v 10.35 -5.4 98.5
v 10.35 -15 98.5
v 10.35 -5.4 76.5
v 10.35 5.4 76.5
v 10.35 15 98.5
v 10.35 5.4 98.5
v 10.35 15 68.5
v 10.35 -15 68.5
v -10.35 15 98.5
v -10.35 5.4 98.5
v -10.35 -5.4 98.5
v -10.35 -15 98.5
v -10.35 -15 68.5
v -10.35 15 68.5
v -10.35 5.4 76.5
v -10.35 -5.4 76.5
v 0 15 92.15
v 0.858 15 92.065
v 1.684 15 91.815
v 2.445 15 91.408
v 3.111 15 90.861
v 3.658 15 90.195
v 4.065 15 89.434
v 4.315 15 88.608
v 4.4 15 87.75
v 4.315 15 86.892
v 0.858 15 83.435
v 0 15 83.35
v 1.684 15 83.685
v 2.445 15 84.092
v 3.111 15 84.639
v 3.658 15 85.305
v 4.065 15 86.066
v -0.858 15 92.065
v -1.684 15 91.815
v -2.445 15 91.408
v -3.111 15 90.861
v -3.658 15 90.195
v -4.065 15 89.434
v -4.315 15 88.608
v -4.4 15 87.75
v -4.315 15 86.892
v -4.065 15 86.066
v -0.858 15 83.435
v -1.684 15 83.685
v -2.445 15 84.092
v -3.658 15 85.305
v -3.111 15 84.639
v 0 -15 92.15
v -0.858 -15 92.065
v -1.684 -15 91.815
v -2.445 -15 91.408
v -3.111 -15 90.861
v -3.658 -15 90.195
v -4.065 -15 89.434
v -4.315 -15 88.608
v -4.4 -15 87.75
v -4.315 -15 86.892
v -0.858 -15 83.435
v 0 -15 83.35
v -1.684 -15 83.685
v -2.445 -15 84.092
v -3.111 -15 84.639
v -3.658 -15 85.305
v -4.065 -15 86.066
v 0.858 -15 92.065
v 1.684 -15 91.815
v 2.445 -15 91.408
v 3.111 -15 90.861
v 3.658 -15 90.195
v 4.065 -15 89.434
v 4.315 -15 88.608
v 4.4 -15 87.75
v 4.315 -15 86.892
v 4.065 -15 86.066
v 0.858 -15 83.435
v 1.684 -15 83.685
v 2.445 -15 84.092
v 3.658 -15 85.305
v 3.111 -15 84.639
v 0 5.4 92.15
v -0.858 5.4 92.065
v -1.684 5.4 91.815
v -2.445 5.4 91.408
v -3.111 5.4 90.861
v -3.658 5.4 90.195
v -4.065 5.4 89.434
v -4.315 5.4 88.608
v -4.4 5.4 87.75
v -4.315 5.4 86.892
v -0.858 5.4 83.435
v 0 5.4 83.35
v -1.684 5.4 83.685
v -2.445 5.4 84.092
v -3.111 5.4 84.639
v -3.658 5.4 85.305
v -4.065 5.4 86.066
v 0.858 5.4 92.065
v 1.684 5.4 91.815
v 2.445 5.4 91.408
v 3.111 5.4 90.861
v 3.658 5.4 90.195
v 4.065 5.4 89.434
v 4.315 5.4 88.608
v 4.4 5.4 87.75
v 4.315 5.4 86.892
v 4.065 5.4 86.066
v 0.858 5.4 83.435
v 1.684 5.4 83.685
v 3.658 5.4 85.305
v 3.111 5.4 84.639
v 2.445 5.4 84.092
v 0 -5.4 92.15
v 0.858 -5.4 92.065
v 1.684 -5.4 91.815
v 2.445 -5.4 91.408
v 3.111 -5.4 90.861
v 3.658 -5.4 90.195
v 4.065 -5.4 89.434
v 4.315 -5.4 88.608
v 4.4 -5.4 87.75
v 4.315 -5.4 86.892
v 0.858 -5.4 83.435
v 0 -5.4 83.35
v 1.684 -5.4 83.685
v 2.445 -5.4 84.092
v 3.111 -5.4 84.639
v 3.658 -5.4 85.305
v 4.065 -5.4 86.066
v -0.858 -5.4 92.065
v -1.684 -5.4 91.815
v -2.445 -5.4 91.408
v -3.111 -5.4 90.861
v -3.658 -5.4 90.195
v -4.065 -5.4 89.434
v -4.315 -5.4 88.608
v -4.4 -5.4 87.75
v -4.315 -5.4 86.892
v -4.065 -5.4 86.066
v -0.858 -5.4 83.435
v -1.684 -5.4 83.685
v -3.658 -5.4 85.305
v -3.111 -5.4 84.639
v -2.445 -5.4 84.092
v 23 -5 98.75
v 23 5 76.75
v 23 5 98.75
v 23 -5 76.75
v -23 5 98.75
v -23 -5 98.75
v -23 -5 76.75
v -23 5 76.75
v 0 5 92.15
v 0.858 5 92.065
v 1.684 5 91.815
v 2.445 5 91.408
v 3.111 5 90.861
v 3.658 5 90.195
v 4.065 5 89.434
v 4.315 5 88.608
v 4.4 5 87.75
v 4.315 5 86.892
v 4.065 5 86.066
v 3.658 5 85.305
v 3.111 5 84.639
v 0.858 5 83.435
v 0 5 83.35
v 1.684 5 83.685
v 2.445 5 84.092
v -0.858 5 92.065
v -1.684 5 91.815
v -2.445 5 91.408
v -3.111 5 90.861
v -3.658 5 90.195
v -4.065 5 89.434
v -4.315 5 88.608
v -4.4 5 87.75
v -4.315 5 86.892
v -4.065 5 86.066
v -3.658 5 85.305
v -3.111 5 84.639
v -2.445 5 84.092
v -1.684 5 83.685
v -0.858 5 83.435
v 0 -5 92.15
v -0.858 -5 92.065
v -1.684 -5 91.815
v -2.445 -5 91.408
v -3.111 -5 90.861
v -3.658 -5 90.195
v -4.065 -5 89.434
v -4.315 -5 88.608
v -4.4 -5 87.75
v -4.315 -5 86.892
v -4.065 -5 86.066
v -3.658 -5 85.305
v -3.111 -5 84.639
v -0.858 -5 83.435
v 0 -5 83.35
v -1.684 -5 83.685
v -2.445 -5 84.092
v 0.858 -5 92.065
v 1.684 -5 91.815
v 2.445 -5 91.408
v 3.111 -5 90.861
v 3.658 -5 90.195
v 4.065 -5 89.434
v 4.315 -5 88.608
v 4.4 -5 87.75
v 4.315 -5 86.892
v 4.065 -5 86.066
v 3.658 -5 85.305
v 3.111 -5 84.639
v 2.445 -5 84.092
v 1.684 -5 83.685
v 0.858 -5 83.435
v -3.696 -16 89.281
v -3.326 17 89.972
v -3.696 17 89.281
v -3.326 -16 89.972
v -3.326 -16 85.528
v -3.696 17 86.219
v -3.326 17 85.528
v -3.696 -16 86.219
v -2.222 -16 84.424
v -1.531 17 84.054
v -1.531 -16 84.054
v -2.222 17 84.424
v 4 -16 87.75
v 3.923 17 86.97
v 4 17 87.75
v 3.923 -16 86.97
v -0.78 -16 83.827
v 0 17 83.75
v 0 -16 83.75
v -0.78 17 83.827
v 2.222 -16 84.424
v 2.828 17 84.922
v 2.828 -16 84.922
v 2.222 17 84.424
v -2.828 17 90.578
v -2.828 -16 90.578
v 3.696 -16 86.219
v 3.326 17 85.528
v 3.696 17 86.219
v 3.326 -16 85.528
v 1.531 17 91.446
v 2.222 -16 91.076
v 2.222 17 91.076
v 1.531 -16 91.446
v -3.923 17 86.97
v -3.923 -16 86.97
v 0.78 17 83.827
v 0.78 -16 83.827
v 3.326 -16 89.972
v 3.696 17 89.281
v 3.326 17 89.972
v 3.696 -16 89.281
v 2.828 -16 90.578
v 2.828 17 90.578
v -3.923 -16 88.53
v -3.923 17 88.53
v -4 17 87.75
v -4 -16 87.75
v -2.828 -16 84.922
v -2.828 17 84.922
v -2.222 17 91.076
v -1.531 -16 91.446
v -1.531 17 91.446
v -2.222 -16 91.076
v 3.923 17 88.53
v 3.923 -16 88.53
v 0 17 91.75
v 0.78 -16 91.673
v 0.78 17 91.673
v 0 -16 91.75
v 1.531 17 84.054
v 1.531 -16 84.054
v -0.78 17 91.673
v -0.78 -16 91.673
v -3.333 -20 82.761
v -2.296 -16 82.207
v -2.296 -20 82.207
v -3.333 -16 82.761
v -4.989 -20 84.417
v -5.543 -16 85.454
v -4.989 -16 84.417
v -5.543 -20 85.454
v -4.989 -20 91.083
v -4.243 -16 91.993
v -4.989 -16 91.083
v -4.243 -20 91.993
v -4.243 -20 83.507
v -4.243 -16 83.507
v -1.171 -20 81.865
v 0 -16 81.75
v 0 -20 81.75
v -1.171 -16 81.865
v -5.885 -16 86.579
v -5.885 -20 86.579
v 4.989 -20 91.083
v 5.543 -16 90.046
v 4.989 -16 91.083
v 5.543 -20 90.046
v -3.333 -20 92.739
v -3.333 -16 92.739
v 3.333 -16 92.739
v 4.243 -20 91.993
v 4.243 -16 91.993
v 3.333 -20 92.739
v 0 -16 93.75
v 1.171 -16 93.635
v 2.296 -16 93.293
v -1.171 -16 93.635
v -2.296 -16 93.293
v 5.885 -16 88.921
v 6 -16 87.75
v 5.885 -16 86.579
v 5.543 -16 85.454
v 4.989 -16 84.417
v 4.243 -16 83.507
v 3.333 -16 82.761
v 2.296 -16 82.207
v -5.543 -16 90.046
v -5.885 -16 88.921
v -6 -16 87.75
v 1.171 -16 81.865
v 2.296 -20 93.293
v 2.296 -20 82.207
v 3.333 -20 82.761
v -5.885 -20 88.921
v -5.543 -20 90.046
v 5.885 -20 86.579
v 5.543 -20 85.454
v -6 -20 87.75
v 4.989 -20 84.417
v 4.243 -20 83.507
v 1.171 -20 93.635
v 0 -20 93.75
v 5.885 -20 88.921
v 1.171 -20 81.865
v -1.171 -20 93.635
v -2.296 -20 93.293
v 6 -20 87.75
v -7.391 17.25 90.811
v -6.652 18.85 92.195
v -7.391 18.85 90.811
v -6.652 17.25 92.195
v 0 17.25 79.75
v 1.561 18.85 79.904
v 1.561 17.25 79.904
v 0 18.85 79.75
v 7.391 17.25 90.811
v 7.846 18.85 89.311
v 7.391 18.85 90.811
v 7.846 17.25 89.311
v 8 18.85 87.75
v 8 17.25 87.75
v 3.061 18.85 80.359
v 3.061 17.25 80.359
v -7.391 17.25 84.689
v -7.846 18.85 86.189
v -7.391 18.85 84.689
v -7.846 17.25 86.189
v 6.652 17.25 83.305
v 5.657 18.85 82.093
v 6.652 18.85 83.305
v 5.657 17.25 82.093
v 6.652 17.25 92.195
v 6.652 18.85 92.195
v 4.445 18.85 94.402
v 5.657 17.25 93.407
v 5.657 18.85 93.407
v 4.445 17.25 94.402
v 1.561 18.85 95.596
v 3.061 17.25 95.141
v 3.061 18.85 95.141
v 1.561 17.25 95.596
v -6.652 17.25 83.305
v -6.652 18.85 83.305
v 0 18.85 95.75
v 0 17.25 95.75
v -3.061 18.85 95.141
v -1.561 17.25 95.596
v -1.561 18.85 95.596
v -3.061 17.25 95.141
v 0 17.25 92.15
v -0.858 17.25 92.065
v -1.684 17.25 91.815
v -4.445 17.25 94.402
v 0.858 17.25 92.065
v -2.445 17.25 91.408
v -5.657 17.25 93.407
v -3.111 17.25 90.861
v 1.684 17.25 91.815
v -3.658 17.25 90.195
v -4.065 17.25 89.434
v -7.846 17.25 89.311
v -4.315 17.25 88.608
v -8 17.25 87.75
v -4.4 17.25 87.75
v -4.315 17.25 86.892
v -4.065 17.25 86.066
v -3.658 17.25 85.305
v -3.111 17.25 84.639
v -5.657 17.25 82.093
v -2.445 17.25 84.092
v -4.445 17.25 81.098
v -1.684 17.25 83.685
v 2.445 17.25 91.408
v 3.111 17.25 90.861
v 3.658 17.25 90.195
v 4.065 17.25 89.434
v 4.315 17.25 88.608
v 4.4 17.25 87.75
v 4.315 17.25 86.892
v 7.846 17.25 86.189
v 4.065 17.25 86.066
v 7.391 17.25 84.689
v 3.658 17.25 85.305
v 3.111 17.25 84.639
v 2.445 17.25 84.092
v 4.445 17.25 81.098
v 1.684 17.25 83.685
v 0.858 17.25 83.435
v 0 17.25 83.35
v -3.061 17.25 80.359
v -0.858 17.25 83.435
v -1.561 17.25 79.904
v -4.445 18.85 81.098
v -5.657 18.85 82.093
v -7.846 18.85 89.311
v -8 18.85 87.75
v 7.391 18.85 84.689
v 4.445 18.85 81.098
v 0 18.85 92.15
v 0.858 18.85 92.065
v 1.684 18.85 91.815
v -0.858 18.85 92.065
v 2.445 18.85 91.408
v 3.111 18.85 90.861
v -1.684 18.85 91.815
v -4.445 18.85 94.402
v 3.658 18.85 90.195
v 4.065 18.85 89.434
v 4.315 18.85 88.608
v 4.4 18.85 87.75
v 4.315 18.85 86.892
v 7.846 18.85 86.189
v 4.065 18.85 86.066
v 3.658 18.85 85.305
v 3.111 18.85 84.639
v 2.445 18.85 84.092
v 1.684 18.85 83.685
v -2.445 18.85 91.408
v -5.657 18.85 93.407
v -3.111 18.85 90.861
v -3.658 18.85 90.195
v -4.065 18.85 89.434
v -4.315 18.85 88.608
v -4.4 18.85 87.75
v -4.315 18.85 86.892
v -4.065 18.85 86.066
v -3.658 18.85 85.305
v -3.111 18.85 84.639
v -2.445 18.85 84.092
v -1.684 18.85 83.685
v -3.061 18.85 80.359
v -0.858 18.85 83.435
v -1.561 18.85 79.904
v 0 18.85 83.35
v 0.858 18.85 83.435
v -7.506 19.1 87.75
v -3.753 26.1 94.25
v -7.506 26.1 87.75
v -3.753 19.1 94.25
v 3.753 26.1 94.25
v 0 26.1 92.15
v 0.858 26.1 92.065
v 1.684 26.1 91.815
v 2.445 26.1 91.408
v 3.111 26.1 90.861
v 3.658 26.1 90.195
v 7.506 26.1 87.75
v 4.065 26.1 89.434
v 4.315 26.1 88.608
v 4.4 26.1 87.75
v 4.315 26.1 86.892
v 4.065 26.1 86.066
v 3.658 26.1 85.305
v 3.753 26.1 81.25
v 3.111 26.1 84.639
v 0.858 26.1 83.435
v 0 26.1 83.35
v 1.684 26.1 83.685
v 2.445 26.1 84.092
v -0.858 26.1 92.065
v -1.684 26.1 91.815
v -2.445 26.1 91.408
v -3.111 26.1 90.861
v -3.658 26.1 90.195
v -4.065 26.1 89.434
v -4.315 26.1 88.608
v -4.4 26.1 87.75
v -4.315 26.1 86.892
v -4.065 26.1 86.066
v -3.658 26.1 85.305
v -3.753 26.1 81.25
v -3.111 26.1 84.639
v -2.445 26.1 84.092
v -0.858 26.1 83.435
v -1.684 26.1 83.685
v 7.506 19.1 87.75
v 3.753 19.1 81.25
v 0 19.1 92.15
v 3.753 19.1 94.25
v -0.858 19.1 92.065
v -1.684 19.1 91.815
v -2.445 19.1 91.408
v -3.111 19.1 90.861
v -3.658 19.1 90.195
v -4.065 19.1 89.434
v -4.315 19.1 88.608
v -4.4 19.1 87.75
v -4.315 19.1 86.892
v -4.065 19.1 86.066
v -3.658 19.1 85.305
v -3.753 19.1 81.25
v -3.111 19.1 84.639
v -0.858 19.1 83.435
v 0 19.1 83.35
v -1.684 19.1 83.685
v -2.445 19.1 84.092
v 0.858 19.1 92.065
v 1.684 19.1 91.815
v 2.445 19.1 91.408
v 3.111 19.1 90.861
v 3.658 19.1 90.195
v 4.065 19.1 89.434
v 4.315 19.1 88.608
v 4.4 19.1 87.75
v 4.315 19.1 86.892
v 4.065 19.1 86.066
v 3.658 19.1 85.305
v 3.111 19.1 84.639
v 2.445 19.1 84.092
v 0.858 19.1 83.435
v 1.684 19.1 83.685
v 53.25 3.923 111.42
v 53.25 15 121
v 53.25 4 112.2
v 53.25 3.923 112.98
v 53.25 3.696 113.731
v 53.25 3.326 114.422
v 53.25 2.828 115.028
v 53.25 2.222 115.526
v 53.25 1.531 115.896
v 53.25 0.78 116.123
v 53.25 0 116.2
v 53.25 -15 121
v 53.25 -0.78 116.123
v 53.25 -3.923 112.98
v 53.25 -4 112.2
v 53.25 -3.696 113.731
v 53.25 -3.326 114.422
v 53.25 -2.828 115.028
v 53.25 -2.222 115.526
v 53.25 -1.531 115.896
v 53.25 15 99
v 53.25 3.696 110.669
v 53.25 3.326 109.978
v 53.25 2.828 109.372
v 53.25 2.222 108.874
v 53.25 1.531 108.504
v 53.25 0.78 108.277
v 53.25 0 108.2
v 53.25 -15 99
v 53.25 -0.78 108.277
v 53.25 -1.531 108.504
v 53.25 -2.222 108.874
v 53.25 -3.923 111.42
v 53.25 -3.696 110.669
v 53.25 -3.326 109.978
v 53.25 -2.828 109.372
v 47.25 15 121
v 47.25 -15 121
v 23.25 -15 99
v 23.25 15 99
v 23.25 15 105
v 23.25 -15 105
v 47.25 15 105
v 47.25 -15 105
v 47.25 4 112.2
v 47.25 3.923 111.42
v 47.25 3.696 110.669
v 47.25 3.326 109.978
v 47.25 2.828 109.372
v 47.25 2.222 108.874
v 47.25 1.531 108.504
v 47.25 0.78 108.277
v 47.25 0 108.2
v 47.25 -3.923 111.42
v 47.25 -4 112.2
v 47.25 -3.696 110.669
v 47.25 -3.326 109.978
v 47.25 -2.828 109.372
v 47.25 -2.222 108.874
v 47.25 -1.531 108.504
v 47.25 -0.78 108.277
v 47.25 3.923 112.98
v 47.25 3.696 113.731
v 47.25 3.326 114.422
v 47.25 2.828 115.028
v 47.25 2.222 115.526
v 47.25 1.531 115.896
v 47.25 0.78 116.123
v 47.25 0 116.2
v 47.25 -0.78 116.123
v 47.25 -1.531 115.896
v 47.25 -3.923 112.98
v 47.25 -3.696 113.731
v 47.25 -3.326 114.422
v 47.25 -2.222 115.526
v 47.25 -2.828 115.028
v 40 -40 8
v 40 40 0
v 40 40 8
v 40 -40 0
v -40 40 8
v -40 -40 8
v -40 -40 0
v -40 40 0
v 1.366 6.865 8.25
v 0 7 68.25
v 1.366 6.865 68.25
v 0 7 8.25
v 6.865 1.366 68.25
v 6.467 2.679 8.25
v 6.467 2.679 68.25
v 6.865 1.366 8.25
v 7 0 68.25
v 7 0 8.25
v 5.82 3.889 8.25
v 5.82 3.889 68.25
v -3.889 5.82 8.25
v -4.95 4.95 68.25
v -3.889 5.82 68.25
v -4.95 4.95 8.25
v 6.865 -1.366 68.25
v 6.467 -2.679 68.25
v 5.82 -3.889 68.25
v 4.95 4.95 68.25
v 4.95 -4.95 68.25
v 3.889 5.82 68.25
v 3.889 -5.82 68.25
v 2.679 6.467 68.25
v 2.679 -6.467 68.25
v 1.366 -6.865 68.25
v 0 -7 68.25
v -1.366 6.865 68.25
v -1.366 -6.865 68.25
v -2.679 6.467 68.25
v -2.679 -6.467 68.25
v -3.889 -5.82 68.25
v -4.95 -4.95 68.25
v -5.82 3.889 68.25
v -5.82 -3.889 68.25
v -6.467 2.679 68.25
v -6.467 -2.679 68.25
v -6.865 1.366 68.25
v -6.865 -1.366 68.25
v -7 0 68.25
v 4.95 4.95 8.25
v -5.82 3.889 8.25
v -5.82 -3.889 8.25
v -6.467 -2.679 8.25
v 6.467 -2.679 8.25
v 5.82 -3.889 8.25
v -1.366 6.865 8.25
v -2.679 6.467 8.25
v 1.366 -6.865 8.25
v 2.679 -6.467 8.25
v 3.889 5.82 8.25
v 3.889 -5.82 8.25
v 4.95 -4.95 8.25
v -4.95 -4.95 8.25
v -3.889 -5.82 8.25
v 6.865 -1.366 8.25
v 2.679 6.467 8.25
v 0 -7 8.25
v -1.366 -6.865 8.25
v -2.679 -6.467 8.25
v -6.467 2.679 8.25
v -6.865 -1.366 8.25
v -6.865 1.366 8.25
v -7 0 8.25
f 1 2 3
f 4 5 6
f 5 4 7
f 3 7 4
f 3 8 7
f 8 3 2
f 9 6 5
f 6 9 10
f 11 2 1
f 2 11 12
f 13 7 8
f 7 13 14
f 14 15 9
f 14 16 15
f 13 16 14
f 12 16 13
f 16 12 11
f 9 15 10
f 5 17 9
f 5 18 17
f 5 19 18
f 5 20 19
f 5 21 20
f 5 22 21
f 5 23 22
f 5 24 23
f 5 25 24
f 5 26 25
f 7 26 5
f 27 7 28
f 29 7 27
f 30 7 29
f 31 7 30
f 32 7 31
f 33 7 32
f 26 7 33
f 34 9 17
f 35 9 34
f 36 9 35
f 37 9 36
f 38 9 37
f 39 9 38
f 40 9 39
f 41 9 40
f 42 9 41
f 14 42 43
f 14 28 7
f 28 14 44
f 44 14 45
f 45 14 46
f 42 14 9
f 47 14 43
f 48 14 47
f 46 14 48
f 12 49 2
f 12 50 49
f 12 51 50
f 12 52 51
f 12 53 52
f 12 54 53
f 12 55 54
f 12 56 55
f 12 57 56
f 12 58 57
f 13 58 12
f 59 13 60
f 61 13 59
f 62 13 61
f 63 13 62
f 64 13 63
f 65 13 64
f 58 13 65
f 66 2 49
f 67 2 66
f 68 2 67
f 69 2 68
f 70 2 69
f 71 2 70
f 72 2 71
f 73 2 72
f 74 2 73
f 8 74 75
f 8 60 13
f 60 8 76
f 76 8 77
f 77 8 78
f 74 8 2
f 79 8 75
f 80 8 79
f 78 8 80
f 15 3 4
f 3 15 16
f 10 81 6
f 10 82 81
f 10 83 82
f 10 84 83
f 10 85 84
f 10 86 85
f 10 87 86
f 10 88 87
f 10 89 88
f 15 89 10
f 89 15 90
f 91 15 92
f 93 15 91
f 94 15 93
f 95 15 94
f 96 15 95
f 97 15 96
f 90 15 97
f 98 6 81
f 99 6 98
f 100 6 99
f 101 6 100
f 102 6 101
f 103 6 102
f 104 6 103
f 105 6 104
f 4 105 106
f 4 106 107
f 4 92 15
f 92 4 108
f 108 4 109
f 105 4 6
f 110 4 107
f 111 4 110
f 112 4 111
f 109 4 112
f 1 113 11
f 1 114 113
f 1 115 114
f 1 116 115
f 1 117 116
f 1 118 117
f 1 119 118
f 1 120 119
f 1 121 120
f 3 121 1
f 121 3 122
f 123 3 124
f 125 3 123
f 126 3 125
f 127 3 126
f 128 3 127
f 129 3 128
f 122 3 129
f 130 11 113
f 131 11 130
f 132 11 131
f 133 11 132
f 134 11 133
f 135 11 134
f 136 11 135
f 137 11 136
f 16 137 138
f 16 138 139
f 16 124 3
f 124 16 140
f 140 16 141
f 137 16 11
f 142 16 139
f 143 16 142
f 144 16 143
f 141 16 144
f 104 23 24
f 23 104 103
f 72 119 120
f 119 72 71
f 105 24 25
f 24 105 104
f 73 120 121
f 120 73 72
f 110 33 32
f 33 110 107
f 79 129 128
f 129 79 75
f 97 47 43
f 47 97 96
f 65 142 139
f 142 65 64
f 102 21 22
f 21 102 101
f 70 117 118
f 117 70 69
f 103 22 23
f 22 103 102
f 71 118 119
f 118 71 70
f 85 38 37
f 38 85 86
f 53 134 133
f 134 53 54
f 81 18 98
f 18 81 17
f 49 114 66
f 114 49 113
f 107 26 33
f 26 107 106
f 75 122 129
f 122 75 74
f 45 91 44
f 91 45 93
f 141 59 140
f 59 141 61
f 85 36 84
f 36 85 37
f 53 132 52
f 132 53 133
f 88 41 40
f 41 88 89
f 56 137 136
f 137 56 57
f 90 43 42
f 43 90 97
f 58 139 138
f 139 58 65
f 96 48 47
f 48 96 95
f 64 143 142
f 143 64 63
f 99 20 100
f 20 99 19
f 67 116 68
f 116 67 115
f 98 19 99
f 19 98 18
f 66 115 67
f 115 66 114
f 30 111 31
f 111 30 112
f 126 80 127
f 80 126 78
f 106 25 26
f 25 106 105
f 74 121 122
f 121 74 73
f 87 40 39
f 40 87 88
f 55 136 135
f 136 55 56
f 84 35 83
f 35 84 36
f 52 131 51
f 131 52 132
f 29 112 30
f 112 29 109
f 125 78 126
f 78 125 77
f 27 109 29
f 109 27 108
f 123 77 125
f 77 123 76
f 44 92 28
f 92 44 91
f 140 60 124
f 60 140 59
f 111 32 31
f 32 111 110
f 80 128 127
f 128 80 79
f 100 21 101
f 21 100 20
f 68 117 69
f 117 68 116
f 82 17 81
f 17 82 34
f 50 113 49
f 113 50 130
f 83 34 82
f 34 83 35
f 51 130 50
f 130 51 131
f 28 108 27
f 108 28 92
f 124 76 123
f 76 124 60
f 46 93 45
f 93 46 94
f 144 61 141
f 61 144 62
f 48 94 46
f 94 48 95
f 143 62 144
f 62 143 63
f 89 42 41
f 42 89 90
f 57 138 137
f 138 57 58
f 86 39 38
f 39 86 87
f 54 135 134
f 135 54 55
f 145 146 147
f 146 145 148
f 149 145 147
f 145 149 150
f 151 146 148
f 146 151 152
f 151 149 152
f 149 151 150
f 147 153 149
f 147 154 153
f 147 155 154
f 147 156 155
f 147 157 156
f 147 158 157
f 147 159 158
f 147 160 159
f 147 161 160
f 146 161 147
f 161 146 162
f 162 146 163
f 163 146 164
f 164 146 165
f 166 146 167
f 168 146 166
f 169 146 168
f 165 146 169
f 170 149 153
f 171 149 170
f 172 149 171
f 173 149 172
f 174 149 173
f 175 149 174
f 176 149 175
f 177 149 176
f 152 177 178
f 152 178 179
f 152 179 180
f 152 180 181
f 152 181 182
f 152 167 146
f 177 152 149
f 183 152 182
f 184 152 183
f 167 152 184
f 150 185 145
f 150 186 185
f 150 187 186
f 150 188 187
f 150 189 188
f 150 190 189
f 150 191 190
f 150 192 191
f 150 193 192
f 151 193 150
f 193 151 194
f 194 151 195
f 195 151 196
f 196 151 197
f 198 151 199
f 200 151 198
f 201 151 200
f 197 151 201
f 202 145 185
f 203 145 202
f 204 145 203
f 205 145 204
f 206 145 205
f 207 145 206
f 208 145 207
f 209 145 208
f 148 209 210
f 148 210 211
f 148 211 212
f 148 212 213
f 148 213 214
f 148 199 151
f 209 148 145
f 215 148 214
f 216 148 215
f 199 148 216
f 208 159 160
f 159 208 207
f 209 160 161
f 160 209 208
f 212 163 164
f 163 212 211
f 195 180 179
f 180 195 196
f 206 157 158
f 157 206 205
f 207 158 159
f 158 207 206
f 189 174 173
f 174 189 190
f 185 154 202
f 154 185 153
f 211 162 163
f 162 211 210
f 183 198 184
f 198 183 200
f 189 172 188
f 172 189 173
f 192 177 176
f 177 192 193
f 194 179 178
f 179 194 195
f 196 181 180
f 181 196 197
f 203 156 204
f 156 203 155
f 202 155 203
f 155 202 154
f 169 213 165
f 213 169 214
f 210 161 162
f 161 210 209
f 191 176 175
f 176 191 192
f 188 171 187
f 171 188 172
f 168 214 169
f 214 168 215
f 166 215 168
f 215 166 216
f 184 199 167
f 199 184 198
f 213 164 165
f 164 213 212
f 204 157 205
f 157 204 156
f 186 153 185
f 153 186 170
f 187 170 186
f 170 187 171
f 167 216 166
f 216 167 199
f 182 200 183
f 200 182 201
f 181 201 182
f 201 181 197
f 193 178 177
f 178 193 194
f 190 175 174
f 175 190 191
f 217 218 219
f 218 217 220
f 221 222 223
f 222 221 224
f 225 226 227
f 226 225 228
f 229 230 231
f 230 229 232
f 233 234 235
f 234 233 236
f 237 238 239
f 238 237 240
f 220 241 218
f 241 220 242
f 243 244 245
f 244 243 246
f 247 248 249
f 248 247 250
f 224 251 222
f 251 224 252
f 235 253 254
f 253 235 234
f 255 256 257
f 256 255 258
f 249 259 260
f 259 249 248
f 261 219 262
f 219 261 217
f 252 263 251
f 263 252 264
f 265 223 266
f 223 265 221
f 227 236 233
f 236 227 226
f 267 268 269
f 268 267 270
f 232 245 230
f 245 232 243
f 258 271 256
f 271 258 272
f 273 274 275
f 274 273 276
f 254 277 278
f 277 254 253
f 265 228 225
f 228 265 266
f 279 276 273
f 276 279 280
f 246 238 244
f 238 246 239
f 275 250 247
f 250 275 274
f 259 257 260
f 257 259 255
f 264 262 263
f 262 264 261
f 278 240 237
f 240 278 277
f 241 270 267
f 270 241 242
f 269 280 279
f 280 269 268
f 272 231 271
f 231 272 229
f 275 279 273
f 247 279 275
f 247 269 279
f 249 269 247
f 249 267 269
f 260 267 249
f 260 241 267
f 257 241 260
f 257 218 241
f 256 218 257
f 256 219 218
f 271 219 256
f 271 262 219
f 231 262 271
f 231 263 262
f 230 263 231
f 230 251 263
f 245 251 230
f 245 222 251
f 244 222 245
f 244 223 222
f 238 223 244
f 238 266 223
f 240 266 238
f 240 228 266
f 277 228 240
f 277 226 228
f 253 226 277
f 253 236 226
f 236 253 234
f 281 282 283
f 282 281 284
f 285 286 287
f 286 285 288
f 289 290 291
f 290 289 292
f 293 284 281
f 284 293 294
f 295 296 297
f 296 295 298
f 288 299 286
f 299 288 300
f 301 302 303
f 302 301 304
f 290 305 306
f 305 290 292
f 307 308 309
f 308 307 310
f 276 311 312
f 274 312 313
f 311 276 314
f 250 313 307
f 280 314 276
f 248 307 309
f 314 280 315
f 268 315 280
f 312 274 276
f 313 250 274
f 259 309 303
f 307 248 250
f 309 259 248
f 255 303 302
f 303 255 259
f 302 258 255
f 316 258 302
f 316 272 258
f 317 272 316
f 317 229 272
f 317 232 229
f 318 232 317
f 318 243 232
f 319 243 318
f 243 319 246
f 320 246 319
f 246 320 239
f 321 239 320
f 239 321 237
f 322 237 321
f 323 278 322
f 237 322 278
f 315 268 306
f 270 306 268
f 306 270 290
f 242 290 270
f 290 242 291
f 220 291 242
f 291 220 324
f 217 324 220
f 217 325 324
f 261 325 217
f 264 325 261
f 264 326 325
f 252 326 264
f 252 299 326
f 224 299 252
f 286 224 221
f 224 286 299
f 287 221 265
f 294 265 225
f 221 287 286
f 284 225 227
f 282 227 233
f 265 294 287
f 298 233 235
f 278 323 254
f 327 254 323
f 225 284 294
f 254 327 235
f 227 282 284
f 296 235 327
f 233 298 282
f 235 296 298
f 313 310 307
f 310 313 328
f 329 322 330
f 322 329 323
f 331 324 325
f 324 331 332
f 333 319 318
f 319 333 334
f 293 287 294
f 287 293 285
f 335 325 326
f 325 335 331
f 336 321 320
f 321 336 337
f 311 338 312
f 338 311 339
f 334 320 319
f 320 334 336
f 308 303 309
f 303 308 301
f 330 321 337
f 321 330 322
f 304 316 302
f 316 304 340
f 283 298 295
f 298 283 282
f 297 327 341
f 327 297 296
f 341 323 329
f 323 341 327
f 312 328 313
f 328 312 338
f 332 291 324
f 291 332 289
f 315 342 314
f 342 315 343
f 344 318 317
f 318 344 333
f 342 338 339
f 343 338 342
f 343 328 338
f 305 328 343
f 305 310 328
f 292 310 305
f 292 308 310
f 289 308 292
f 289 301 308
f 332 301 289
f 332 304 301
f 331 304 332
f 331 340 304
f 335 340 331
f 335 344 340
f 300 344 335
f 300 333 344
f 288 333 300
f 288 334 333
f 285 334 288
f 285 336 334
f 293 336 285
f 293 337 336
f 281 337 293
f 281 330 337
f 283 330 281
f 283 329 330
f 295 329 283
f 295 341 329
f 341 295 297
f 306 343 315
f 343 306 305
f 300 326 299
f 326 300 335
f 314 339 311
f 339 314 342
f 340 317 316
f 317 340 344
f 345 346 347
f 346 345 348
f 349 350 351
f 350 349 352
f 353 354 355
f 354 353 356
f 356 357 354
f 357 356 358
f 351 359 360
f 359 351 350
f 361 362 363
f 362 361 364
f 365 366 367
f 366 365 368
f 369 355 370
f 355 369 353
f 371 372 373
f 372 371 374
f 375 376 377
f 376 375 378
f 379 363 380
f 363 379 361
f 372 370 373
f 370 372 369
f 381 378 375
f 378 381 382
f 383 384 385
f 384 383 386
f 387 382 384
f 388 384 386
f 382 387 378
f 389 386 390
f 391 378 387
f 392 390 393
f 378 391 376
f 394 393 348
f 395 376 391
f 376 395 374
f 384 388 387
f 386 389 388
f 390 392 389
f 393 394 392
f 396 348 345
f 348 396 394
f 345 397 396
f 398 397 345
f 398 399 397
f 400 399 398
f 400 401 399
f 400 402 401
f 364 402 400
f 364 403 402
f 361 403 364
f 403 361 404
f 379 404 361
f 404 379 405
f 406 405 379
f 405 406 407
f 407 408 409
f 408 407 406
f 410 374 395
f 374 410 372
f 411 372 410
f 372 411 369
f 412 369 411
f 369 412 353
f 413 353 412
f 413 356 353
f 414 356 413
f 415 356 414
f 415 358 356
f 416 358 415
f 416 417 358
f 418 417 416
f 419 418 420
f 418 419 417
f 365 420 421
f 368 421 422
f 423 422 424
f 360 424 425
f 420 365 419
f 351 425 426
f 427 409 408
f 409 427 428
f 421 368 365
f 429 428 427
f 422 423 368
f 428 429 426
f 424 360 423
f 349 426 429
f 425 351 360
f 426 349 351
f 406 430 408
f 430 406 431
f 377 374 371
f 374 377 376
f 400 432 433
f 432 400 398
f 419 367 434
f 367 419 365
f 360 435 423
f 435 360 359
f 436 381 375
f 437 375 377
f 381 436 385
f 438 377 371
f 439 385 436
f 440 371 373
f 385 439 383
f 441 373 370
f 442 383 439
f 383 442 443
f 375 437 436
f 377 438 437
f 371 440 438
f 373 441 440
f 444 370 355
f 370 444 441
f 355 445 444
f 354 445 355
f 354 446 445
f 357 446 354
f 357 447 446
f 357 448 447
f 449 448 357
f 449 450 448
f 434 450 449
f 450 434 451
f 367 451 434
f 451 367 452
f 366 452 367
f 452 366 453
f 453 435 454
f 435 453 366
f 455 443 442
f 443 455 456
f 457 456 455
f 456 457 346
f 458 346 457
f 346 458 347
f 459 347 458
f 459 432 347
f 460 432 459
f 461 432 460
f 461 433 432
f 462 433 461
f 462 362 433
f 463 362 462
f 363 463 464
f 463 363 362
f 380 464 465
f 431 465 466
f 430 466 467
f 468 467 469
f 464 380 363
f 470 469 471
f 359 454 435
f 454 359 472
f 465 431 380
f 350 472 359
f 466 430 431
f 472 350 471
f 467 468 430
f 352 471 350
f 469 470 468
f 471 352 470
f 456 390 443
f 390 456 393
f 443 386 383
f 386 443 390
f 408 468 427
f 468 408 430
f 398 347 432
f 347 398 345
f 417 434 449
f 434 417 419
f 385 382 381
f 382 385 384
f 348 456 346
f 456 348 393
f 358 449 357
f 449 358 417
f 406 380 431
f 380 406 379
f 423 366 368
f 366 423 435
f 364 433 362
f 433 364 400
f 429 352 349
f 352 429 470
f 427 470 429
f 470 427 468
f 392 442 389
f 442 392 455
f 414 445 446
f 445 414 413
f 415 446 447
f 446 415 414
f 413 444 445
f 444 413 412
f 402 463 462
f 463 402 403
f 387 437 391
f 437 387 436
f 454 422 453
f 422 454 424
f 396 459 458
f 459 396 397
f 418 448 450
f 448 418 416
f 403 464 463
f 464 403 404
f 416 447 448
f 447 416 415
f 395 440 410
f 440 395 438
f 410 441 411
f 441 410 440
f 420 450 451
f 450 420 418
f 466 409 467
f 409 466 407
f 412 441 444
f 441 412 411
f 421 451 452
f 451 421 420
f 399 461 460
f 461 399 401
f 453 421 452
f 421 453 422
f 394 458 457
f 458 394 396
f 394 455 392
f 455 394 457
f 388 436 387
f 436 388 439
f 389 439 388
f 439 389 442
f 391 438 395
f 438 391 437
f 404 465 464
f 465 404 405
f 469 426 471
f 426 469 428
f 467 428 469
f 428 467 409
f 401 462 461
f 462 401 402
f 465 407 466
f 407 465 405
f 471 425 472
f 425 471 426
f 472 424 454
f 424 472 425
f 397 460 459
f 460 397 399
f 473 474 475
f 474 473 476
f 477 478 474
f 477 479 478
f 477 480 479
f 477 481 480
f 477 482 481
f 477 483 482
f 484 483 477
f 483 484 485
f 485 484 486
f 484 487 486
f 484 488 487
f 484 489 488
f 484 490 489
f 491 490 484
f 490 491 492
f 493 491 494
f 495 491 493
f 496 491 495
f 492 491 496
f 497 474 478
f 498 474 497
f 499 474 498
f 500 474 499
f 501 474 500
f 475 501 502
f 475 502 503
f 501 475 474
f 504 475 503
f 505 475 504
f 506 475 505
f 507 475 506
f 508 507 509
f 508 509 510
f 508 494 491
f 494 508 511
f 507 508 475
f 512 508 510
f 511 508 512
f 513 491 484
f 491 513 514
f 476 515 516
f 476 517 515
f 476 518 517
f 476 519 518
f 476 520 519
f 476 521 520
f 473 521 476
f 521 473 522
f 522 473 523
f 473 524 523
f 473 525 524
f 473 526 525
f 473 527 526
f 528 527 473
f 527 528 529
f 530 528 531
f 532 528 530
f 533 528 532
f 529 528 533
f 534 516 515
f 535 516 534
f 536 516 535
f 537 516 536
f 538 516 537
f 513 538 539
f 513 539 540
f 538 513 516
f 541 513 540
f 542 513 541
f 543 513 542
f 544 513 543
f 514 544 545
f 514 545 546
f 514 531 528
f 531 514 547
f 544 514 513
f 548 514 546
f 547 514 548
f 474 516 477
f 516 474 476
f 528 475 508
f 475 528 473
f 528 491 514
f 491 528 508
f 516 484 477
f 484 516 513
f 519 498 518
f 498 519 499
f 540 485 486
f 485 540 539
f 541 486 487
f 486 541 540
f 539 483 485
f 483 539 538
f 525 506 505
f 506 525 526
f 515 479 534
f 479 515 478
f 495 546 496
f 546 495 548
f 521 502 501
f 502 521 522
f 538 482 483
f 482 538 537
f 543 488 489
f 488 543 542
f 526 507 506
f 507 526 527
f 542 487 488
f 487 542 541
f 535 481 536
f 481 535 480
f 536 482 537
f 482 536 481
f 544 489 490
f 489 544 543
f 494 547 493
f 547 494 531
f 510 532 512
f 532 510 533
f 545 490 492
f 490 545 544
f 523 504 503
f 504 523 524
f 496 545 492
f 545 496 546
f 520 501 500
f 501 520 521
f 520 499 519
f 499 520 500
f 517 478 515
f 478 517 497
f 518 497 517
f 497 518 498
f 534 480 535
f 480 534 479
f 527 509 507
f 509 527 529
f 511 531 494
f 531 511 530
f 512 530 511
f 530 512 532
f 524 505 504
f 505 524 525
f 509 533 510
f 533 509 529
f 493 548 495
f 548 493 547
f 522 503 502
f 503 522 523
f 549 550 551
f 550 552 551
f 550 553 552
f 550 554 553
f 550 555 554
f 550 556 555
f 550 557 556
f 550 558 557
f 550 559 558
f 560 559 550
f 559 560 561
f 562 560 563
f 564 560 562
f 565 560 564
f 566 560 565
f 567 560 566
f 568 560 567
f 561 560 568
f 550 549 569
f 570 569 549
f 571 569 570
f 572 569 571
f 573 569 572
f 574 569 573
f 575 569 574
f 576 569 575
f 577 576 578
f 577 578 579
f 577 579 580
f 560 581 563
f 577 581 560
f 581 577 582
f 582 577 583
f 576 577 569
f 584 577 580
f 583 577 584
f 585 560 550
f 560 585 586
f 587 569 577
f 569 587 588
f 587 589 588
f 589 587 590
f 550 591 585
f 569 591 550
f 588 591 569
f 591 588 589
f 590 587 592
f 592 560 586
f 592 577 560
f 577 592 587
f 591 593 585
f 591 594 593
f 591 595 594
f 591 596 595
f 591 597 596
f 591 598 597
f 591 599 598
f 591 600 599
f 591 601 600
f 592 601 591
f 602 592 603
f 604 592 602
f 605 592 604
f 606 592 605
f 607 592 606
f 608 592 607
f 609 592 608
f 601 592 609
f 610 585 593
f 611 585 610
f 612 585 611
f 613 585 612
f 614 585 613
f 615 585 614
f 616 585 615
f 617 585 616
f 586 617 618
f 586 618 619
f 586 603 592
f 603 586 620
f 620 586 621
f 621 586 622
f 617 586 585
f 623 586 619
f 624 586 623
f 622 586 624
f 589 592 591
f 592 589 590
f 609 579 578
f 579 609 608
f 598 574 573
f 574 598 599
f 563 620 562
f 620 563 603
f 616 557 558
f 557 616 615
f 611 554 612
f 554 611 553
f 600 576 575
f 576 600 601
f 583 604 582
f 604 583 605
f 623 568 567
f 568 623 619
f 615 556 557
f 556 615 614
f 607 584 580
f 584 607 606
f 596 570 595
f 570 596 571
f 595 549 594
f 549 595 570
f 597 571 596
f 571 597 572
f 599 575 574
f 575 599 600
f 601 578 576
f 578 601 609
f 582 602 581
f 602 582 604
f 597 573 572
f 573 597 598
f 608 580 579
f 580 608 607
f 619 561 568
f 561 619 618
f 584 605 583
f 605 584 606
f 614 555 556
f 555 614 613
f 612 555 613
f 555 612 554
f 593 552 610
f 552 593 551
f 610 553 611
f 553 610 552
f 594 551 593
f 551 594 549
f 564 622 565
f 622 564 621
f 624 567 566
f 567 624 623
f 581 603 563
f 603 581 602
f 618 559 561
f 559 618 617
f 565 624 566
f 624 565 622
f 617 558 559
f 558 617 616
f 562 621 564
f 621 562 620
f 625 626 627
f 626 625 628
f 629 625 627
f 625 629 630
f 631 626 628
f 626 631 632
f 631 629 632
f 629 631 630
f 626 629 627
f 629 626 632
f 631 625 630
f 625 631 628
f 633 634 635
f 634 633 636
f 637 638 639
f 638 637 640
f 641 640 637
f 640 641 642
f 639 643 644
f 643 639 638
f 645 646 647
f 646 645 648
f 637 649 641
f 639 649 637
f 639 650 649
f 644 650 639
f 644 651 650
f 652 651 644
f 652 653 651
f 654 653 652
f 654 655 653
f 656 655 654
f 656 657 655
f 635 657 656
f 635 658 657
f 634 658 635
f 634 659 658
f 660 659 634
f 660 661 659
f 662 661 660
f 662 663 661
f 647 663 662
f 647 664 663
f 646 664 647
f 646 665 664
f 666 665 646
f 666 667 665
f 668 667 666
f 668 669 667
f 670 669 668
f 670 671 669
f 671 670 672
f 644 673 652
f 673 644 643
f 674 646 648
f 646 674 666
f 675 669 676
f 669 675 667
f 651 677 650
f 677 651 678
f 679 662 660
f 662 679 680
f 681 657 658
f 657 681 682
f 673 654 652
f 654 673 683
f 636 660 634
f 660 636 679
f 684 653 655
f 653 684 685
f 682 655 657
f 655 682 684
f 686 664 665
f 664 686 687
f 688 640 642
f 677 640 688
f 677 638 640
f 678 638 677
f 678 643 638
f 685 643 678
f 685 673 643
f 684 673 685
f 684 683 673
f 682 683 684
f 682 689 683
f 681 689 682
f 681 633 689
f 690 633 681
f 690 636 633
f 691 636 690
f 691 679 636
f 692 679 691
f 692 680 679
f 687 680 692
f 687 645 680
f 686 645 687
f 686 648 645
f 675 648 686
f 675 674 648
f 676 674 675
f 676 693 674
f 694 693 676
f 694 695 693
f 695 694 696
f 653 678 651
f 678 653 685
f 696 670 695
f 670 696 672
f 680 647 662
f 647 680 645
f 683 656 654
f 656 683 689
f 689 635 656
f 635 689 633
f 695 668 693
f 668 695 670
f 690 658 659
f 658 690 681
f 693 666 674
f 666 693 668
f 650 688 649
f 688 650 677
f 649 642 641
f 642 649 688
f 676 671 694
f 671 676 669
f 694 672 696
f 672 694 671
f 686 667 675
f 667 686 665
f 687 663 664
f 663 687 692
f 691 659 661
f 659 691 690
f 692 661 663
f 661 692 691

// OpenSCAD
$fn = 32;

// ------------------------------------------------------------------------
// Lamp arm: column d14 x 60 mm, arm 46 mm
// Every part is its own module, assembly() places every instance.
// ------------------------------------------------------------------------

// --- part 1 ---
module lamp_base() {
  difference() {
    translate([-40, -40, 0]) cube([80, 80, 8]);
  }
}

// --- part 2 ---
module lamp_column() {
  cylinder(h = 60, d = 14);
}

// --- part 3 ---
module head_fork() {
  difference() {
    translate([-10.35, -15, 0]) cube([20.7, 30, 30]);
    translate([-11.35, -5.4, 8]) cube([22.7, 10.8, 23]);
    translate([0, 0, 19.25]) rotate([90, 0, 0]) cylinder(h = 32, d = 8.8, center = true);
  }
}

// --- part 4 ---
module lamp_arm() {
  difference() {
    translate([-23, -5, 0]) cube([46, 10, 22]);
    translate([0, 0, 11]) rotate([90, 0, 0]) cylinder(h = 12, d = 8.8, center = true);
  }
}

// --- part 5 ---
module arm_pin() {
  rotate([0, 90, 0]) cylinder(h = 34, d = 8, center = true);
  translate([-20, 0, 0]) rotate([0, 90, 0]) cylinder(h = 4, d = 12);
}

// --- part 6 ---
module arm_washer() {
  difference() {
      translate([0, 0, 0]) cylinder(h = 1.6, d = 16);
      translate([0, 0, -1]) cylinder(h = 3.6, d = 8.8);
    }
}

// --- part 7 ---
module arm_nut() {
  difference() {
    linear_extrude(height = 7) polygon(points = [[7.506, 0], [3.753, 6.5], [-3.753, 6.5], [-7.506, 0], [-3.753, -6.5], [3.753, -6.5]]);
    translate([0, 0, -1]) cylinder(h = 9, d = 8.8);
  }
}

// --- part 8 ---
module shade_bracket() {
  difference() {
    translate([-15, -15, 0]) cube([30, 30, 22]);
    translate([-16, -16, 6]) cube([25, 32, 17]);
    translate([12, 0, 13.2]) rotate([0, 90, 0]) cylinder(h = 8, d = 8, center = true);
  }
}

// --- assembly ---
module assembly() {
  color([0.80, 0.24, 0.20]) translate([0, 0, 0]) rotate([0, 0, 0]) lamp_base();
  color([0.20, 0.45, 0.75]) translate([0, 0, 8.25]) rotate([0, 0, 0]) lamp_column();
  color([0.25, 0.62, 0.32]) translate([0, 0, 68.5]) rotate([0, 0, 0]) head_fork();
  color([0.92, 0.70, 0.18]) translate([0, 0, 76.75]) rotate([0, 0, 0]) lamp_arm();
  color([0.58, 0.35, 0.70]) translate([0, 0, 87.75]) rotate([0, 0, 90]) arm_pin();
  color([0.16, 0.66, 0.66]) translate([0, 18.85, 87.75]) rotate([90, 0, 0]) arm_washer();
  color([0.85, 0.48, 0.18]) translate([0, 26.1, 87.75]) rotate([90, 0, 0]) arm_nut();
  color([0.55, 0.60, 0.65]) translate([38.25, 0, 99]) rotate([0, 0, 0]) shade_bracket();
}

assembly();
